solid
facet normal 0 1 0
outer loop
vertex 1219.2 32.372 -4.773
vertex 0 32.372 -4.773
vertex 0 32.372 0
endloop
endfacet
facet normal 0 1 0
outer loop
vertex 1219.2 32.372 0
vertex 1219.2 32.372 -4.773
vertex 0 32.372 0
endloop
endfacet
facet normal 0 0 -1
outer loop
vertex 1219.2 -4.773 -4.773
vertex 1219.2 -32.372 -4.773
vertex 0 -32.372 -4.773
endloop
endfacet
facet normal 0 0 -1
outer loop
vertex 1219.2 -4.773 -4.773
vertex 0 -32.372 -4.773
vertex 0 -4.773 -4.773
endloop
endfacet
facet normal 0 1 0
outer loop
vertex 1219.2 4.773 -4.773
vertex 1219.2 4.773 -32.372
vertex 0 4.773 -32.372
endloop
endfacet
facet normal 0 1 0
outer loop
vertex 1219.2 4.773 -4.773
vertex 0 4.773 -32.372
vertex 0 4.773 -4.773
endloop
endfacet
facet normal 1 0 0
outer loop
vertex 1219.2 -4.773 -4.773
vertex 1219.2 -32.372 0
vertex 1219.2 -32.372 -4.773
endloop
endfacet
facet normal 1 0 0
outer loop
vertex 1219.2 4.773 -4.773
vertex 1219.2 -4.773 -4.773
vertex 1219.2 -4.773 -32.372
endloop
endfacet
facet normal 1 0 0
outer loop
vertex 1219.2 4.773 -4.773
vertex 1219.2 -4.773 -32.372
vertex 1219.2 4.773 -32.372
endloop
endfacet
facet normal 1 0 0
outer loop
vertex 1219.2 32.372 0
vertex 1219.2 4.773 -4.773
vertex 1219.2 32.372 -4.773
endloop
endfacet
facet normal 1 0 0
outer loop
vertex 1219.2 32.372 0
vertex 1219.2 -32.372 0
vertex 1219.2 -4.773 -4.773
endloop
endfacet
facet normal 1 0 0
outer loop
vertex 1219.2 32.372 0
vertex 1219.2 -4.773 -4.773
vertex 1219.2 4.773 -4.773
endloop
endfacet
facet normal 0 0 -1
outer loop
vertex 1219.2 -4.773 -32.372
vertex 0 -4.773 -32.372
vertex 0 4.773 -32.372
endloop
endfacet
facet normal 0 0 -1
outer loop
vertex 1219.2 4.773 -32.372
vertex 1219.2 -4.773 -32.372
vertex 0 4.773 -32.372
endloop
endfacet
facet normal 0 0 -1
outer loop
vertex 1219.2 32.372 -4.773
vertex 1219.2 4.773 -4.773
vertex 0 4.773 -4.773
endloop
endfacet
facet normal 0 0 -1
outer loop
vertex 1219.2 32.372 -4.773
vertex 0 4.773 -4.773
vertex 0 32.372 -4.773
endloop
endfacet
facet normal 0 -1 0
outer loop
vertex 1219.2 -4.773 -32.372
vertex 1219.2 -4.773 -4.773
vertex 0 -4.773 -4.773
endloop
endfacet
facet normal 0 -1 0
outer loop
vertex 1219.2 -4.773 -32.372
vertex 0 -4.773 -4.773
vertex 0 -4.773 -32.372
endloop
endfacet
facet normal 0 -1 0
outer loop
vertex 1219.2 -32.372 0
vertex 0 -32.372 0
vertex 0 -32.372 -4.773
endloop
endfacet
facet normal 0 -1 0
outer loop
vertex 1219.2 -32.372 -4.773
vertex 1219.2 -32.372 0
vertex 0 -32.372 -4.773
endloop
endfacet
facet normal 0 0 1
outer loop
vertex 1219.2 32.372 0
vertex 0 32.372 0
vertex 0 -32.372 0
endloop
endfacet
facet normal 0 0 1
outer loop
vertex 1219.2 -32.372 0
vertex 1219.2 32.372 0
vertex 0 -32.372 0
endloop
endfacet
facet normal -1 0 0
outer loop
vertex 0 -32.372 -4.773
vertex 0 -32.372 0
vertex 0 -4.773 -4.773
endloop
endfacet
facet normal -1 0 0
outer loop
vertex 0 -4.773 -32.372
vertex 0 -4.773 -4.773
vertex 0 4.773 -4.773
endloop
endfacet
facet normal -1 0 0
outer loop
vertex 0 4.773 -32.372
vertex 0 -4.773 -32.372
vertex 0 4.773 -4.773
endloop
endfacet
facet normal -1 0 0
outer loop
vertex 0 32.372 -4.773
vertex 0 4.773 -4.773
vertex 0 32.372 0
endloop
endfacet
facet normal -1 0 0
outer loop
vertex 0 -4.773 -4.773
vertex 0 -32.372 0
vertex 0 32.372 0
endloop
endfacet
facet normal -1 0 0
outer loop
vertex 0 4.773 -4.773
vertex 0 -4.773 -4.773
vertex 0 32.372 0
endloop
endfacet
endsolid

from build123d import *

# Parameters (mm, degrees)
F1_DEPTH = 1219.2


with BuildPart() as f1:
    # F0 (on Right) → F1 (new body)
    with BuildSketch(Plane.YZ):
        Polygon((0, -32.372466), (0, 0), (-32.372466, 0), (-32.372466, -4.772527), (-4.772527, -4.772527), (-4.772527, -32.372466), align=None)
        Polygon((32.372466, 0), (0, 0), (0, -32.372466), (4.772527, -32.372466), (4.772527, -4.772527), (32.372466, -4.772527), align=None)
    extrude(amount=F1_DEPTH)


solid = f1.part
